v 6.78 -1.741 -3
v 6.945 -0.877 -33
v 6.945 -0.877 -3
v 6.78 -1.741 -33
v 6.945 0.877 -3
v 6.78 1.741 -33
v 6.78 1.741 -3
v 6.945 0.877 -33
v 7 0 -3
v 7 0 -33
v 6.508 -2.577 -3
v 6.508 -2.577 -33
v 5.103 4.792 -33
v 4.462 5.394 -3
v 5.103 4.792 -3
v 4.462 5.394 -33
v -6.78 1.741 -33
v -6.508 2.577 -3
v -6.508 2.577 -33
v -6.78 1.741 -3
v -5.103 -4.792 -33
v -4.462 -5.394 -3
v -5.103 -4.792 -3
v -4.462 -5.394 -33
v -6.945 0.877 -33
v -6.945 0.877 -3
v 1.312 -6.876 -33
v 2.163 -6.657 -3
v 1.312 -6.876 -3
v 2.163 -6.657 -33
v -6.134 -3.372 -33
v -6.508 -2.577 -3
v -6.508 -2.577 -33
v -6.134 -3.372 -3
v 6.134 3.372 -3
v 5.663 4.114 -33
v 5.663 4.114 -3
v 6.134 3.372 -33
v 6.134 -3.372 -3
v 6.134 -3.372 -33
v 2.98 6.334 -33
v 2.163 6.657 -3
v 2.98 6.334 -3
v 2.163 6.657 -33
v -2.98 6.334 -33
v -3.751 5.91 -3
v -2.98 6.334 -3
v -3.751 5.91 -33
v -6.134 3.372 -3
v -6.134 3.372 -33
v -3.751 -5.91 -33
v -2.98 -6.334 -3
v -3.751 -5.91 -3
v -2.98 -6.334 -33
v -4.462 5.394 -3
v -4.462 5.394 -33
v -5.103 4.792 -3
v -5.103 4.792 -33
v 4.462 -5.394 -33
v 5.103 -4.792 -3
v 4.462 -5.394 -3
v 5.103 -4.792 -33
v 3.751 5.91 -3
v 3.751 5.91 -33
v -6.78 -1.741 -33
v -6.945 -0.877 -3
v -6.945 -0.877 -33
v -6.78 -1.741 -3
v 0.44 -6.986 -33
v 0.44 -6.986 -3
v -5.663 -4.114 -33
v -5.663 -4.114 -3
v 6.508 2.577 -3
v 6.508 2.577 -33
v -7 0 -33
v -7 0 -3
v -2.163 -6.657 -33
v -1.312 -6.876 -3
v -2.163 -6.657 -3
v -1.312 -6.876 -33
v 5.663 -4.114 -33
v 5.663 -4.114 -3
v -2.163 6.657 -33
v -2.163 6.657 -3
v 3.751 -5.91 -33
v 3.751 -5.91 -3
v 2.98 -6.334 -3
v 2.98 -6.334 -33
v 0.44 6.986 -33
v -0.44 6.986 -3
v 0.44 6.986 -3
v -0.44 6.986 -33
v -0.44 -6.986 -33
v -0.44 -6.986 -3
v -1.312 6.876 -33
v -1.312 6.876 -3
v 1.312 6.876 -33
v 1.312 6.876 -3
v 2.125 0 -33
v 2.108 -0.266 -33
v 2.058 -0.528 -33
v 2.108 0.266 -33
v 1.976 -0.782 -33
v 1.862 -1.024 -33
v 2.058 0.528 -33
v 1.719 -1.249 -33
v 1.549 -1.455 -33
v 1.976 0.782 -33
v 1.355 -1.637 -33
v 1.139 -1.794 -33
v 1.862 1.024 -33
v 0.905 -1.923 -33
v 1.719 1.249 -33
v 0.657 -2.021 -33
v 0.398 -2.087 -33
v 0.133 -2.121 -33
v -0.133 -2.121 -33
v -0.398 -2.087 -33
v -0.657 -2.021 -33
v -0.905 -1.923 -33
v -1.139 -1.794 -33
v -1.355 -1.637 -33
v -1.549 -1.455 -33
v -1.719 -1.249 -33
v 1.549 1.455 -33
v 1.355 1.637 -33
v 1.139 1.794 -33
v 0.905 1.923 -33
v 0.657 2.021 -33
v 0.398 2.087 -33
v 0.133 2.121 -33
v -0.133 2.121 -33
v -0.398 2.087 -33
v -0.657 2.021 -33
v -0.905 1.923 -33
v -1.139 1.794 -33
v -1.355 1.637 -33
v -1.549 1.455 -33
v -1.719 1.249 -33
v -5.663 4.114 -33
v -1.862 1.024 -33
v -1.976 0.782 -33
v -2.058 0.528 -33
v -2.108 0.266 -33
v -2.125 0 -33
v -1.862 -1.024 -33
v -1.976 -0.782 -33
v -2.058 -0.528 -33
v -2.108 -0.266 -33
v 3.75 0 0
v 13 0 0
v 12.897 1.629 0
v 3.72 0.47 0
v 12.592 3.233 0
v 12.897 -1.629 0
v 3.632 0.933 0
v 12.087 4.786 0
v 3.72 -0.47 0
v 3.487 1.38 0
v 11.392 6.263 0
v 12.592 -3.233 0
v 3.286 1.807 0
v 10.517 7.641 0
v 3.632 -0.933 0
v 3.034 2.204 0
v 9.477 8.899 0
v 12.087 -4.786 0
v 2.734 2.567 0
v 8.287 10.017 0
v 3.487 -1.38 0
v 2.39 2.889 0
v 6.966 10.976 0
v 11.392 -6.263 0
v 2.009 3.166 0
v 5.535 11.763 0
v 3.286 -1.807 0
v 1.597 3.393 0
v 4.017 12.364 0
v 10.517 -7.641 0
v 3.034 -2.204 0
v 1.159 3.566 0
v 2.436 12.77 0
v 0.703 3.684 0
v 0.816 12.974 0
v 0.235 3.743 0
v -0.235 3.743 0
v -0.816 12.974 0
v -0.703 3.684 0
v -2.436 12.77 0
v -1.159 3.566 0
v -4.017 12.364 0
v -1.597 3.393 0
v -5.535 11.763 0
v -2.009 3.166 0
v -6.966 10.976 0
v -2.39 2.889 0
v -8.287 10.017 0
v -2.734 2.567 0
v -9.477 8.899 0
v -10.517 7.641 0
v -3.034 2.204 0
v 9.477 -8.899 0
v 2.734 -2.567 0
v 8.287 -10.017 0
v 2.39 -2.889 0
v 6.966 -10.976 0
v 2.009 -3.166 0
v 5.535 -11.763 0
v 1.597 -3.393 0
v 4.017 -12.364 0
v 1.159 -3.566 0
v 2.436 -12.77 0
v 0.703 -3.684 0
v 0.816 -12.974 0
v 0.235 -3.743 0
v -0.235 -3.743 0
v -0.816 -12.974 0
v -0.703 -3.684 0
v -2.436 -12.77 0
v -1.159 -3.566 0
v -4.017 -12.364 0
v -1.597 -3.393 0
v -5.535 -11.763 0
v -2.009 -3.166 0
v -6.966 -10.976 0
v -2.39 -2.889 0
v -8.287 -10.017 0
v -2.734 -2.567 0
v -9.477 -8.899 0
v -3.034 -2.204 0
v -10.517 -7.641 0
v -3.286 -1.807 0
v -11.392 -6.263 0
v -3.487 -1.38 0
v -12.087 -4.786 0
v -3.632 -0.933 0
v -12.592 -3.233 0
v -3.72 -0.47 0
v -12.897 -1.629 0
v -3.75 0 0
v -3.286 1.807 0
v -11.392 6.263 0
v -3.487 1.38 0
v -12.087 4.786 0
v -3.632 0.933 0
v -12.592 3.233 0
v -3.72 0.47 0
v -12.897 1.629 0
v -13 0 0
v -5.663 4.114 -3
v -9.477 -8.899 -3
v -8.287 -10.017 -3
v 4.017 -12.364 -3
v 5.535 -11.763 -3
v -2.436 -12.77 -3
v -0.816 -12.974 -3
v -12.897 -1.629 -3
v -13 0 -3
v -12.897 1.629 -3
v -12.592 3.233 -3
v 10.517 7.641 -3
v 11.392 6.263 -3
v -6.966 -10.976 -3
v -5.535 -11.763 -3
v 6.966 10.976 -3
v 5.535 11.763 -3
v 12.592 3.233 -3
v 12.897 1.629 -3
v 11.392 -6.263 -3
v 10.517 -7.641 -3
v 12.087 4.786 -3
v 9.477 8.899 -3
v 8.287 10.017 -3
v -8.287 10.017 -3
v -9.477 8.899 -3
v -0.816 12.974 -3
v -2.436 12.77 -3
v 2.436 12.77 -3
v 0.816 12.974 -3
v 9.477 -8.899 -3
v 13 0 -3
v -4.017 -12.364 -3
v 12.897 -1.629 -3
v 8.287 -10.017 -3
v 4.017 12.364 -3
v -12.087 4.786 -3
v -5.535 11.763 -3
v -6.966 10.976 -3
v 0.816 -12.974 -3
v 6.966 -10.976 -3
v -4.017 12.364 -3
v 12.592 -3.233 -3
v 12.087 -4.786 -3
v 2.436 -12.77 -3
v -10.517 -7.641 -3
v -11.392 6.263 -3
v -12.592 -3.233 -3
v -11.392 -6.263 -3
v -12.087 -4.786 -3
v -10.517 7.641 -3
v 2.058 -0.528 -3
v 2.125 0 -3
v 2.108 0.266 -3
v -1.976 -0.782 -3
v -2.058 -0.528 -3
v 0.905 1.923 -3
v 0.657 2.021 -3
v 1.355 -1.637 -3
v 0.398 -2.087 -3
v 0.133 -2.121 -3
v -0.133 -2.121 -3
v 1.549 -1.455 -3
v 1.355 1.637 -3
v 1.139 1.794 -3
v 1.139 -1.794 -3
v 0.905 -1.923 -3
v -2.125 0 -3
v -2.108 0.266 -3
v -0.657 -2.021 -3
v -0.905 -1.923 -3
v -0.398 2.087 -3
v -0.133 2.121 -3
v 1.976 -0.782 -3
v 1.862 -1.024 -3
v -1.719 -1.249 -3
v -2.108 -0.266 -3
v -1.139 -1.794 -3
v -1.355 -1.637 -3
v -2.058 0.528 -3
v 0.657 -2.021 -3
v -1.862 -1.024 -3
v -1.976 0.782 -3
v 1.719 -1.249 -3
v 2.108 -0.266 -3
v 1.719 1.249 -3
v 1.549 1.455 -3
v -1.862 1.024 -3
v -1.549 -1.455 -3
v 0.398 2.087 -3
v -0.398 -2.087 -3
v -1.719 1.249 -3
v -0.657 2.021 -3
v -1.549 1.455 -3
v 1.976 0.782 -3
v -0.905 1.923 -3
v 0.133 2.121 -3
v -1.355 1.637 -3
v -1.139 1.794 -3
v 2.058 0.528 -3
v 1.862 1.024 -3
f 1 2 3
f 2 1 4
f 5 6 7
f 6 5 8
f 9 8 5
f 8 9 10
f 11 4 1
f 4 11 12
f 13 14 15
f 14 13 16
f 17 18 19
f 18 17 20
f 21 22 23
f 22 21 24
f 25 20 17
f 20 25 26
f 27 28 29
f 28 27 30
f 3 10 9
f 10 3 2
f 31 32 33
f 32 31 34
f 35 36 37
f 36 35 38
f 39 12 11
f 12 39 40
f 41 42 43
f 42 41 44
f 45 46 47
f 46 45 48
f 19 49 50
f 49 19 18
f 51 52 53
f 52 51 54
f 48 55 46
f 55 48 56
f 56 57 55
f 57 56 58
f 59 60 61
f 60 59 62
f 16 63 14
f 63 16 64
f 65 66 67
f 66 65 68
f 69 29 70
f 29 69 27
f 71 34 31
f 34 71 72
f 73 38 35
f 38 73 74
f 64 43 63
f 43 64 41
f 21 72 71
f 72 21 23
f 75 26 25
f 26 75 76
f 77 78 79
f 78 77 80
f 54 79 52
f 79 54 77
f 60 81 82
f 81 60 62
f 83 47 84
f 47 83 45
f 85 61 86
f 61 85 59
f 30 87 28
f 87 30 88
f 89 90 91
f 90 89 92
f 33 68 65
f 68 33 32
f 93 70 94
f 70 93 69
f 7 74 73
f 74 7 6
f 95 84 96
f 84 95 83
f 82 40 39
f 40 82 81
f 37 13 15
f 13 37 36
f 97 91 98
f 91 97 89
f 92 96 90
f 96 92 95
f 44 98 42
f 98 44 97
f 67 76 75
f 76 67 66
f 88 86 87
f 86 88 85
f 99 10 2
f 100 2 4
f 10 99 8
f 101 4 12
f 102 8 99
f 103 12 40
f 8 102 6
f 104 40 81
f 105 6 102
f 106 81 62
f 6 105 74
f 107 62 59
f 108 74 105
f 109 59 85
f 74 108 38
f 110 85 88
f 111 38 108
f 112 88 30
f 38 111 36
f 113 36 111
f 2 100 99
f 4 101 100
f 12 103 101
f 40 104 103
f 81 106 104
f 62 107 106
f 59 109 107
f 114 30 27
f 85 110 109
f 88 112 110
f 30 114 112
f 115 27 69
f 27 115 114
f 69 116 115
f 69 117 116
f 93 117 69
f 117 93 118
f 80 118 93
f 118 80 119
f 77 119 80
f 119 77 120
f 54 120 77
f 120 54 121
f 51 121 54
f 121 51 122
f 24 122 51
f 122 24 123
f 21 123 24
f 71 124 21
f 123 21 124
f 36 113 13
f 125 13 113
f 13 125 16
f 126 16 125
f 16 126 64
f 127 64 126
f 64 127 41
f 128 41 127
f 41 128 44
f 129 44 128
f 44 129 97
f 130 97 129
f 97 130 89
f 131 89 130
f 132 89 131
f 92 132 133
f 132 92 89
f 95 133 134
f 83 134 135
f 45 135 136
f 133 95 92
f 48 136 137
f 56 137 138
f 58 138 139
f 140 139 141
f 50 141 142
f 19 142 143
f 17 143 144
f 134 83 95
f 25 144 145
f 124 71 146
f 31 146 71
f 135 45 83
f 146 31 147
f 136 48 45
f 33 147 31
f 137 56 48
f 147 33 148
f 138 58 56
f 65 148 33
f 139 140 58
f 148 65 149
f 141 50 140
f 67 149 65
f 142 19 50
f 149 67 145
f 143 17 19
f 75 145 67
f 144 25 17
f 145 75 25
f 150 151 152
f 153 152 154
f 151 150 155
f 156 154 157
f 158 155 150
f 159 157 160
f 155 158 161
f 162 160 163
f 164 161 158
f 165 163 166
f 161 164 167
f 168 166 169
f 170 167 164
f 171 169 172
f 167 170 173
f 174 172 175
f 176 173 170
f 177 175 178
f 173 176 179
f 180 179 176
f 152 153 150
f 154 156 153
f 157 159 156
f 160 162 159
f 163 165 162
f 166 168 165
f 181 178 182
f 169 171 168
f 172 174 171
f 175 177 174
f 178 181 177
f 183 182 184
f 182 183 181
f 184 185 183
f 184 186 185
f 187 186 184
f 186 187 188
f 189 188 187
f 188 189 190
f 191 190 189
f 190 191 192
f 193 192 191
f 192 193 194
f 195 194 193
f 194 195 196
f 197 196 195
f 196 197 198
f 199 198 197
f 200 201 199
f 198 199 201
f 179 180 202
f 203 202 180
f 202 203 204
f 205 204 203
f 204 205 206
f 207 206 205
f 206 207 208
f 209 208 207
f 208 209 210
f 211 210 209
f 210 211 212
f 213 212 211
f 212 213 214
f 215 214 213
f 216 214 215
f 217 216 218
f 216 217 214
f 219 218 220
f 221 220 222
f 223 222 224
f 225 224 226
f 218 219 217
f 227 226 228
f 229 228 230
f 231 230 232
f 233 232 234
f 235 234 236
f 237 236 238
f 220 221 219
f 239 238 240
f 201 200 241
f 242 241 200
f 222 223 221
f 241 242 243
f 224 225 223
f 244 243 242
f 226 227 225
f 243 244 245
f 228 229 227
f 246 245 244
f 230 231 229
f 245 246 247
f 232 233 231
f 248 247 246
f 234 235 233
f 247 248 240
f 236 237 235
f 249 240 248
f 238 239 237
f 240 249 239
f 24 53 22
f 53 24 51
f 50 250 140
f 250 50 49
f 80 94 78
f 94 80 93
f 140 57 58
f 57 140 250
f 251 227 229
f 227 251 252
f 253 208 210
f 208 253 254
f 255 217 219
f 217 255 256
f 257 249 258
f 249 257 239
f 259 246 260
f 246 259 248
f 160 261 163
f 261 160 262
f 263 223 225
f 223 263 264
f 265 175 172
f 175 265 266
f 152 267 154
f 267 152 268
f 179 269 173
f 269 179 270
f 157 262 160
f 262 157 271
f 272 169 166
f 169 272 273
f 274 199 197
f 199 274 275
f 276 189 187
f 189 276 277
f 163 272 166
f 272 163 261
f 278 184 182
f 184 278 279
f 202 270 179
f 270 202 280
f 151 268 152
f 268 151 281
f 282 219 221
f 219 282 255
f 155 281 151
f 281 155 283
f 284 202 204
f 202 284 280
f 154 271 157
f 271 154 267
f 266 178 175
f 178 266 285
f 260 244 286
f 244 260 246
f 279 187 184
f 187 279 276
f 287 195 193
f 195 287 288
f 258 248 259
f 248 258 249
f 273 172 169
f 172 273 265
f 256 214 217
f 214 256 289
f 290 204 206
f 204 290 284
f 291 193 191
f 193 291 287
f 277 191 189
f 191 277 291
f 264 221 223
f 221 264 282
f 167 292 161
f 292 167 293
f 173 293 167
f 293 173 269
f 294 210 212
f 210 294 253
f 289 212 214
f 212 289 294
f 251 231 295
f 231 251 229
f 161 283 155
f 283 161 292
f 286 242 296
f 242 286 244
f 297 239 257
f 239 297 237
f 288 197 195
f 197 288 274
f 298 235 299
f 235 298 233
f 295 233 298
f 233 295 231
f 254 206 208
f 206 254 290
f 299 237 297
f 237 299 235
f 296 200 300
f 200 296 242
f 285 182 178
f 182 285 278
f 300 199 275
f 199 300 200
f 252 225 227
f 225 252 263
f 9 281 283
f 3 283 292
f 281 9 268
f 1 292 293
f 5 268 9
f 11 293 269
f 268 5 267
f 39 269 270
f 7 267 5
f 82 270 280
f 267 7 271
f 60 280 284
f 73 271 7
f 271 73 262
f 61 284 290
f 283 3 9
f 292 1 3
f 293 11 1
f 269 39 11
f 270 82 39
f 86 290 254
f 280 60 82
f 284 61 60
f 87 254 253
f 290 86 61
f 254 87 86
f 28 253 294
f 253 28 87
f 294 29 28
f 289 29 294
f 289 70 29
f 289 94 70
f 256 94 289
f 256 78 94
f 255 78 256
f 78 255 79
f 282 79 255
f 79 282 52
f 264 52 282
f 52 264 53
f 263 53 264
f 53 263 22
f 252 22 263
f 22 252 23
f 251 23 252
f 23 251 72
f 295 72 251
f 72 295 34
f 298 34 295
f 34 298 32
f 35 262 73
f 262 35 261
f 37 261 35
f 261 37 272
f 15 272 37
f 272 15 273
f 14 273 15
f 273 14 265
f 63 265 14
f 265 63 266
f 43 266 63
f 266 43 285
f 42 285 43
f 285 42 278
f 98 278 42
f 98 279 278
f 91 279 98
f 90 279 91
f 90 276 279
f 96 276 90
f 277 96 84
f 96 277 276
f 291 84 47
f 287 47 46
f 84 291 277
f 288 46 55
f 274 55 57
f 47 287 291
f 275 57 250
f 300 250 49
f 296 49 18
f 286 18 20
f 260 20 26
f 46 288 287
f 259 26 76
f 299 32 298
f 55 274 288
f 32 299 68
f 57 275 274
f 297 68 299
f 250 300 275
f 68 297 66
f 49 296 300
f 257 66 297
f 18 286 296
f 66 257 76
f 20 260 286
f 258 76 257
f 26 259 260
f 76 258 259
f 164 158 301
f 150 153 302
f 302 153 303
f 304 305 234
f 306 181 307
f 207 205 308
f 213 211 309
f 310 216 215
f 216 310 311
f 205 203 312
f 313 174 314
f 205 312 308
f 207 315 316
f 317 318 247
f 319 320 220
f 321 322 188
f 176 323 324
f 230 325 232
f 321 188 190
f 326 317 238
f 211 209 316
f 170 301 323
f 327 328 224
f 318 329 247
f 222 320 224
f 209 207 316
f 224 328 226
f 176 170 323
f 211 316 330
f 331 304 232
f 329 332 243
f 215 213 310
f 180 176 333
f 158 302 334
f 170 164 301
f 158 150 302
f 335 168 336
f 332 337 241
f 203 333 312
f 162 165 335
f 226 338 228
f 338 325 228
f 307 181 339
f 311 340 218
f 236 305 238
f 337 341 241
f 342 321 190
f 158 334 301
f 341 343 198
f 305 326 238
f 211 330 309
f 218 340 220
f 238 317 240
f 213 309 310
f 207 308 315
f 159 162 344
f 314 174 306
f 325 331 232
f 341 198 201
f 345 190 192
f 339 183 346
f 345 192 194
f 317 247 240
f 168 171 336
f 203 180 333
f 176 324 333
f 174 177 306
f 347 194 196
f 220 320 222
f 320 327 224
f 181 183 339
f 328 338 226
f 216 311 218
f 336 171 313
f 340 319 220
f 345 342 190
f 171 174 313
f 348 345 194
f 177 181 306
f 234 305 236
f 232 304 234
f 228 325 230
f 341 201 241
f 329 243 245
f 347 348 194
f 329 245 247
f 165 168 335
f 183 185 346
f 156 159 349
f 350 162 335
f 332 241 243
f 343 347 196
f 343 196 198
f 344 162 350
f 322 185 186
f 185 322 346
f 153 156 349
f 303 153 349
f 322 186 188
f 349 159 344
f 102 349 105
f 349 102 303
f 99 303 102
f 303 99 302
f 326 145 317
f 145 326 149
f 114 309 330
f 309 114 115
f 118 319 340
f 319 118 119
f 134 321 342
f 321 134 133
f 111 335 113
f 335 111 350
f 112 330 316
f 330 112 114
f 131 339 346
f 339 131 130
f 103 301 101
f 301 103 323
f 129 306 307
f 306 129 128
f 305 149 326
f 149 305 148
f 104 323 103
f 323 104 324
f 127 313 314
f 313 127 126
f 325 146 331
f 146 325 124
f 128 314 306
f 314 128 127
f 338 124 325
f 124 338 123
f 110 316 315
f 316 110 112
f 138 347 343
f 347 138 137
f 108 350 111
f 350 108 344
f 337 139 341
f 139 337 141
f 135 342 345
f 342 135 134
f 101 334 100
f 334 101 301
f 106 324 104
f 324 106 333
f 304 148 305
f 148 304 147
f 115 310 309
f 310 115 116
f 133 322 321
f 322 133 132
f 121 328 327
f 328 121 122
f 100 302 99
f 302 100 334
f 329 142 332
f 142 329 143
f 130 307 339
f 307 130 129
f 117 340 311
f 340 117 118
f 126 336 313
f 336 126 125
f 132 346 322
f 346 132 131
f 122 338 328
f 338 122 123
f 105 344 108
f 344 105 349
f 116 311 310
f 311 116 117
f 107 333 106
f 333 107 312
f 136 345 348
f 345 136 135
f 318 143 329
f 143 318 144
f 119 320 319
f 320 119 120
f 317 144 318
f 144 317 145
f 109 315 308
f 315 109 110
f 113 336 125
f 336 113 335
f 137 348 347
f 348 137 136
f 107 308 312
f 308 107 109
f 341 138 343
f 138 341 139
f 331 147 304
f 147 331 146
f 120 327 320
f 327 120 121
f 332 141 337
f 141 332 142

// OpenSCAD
$fn = 50;


difference() {
	union() {
		translate(v = [0, 0, -33.0000000000]) {
			cylinder(h = 33, r = 7.0000000000);
		}
		translate(v = [0, 0, -3.0000000000]) {
			cylinder(h = 3, r = 13.0000000000);
		}
	}
	union() {
		translate(v = [0, 0, 0]) {
			rotate(a = [0, 0, 0]) {
				difference() {
					union() {
						#translate(v = [0, 0, -33.0000000000]) {
							cylinder(h = 33, r = 2.0000000000);
						}
						#translate(v = [0, 0, -3]) {
							cylinder(h = 3, r = 7.0000000000, r1 = 2.1250000000, r2 = 3.7500000000);
						}
						#translate(v = [0, 0, -33.0000000000]) {
							cylinder(h = 33, r = 2.1250000000);
						}
						#translate(v = [0, 0, -33.0000000000]) {
							cylinder(h = 33, r = 2.0000000000);
						}
					}
					union();
				}
			}
		}
	}
}
